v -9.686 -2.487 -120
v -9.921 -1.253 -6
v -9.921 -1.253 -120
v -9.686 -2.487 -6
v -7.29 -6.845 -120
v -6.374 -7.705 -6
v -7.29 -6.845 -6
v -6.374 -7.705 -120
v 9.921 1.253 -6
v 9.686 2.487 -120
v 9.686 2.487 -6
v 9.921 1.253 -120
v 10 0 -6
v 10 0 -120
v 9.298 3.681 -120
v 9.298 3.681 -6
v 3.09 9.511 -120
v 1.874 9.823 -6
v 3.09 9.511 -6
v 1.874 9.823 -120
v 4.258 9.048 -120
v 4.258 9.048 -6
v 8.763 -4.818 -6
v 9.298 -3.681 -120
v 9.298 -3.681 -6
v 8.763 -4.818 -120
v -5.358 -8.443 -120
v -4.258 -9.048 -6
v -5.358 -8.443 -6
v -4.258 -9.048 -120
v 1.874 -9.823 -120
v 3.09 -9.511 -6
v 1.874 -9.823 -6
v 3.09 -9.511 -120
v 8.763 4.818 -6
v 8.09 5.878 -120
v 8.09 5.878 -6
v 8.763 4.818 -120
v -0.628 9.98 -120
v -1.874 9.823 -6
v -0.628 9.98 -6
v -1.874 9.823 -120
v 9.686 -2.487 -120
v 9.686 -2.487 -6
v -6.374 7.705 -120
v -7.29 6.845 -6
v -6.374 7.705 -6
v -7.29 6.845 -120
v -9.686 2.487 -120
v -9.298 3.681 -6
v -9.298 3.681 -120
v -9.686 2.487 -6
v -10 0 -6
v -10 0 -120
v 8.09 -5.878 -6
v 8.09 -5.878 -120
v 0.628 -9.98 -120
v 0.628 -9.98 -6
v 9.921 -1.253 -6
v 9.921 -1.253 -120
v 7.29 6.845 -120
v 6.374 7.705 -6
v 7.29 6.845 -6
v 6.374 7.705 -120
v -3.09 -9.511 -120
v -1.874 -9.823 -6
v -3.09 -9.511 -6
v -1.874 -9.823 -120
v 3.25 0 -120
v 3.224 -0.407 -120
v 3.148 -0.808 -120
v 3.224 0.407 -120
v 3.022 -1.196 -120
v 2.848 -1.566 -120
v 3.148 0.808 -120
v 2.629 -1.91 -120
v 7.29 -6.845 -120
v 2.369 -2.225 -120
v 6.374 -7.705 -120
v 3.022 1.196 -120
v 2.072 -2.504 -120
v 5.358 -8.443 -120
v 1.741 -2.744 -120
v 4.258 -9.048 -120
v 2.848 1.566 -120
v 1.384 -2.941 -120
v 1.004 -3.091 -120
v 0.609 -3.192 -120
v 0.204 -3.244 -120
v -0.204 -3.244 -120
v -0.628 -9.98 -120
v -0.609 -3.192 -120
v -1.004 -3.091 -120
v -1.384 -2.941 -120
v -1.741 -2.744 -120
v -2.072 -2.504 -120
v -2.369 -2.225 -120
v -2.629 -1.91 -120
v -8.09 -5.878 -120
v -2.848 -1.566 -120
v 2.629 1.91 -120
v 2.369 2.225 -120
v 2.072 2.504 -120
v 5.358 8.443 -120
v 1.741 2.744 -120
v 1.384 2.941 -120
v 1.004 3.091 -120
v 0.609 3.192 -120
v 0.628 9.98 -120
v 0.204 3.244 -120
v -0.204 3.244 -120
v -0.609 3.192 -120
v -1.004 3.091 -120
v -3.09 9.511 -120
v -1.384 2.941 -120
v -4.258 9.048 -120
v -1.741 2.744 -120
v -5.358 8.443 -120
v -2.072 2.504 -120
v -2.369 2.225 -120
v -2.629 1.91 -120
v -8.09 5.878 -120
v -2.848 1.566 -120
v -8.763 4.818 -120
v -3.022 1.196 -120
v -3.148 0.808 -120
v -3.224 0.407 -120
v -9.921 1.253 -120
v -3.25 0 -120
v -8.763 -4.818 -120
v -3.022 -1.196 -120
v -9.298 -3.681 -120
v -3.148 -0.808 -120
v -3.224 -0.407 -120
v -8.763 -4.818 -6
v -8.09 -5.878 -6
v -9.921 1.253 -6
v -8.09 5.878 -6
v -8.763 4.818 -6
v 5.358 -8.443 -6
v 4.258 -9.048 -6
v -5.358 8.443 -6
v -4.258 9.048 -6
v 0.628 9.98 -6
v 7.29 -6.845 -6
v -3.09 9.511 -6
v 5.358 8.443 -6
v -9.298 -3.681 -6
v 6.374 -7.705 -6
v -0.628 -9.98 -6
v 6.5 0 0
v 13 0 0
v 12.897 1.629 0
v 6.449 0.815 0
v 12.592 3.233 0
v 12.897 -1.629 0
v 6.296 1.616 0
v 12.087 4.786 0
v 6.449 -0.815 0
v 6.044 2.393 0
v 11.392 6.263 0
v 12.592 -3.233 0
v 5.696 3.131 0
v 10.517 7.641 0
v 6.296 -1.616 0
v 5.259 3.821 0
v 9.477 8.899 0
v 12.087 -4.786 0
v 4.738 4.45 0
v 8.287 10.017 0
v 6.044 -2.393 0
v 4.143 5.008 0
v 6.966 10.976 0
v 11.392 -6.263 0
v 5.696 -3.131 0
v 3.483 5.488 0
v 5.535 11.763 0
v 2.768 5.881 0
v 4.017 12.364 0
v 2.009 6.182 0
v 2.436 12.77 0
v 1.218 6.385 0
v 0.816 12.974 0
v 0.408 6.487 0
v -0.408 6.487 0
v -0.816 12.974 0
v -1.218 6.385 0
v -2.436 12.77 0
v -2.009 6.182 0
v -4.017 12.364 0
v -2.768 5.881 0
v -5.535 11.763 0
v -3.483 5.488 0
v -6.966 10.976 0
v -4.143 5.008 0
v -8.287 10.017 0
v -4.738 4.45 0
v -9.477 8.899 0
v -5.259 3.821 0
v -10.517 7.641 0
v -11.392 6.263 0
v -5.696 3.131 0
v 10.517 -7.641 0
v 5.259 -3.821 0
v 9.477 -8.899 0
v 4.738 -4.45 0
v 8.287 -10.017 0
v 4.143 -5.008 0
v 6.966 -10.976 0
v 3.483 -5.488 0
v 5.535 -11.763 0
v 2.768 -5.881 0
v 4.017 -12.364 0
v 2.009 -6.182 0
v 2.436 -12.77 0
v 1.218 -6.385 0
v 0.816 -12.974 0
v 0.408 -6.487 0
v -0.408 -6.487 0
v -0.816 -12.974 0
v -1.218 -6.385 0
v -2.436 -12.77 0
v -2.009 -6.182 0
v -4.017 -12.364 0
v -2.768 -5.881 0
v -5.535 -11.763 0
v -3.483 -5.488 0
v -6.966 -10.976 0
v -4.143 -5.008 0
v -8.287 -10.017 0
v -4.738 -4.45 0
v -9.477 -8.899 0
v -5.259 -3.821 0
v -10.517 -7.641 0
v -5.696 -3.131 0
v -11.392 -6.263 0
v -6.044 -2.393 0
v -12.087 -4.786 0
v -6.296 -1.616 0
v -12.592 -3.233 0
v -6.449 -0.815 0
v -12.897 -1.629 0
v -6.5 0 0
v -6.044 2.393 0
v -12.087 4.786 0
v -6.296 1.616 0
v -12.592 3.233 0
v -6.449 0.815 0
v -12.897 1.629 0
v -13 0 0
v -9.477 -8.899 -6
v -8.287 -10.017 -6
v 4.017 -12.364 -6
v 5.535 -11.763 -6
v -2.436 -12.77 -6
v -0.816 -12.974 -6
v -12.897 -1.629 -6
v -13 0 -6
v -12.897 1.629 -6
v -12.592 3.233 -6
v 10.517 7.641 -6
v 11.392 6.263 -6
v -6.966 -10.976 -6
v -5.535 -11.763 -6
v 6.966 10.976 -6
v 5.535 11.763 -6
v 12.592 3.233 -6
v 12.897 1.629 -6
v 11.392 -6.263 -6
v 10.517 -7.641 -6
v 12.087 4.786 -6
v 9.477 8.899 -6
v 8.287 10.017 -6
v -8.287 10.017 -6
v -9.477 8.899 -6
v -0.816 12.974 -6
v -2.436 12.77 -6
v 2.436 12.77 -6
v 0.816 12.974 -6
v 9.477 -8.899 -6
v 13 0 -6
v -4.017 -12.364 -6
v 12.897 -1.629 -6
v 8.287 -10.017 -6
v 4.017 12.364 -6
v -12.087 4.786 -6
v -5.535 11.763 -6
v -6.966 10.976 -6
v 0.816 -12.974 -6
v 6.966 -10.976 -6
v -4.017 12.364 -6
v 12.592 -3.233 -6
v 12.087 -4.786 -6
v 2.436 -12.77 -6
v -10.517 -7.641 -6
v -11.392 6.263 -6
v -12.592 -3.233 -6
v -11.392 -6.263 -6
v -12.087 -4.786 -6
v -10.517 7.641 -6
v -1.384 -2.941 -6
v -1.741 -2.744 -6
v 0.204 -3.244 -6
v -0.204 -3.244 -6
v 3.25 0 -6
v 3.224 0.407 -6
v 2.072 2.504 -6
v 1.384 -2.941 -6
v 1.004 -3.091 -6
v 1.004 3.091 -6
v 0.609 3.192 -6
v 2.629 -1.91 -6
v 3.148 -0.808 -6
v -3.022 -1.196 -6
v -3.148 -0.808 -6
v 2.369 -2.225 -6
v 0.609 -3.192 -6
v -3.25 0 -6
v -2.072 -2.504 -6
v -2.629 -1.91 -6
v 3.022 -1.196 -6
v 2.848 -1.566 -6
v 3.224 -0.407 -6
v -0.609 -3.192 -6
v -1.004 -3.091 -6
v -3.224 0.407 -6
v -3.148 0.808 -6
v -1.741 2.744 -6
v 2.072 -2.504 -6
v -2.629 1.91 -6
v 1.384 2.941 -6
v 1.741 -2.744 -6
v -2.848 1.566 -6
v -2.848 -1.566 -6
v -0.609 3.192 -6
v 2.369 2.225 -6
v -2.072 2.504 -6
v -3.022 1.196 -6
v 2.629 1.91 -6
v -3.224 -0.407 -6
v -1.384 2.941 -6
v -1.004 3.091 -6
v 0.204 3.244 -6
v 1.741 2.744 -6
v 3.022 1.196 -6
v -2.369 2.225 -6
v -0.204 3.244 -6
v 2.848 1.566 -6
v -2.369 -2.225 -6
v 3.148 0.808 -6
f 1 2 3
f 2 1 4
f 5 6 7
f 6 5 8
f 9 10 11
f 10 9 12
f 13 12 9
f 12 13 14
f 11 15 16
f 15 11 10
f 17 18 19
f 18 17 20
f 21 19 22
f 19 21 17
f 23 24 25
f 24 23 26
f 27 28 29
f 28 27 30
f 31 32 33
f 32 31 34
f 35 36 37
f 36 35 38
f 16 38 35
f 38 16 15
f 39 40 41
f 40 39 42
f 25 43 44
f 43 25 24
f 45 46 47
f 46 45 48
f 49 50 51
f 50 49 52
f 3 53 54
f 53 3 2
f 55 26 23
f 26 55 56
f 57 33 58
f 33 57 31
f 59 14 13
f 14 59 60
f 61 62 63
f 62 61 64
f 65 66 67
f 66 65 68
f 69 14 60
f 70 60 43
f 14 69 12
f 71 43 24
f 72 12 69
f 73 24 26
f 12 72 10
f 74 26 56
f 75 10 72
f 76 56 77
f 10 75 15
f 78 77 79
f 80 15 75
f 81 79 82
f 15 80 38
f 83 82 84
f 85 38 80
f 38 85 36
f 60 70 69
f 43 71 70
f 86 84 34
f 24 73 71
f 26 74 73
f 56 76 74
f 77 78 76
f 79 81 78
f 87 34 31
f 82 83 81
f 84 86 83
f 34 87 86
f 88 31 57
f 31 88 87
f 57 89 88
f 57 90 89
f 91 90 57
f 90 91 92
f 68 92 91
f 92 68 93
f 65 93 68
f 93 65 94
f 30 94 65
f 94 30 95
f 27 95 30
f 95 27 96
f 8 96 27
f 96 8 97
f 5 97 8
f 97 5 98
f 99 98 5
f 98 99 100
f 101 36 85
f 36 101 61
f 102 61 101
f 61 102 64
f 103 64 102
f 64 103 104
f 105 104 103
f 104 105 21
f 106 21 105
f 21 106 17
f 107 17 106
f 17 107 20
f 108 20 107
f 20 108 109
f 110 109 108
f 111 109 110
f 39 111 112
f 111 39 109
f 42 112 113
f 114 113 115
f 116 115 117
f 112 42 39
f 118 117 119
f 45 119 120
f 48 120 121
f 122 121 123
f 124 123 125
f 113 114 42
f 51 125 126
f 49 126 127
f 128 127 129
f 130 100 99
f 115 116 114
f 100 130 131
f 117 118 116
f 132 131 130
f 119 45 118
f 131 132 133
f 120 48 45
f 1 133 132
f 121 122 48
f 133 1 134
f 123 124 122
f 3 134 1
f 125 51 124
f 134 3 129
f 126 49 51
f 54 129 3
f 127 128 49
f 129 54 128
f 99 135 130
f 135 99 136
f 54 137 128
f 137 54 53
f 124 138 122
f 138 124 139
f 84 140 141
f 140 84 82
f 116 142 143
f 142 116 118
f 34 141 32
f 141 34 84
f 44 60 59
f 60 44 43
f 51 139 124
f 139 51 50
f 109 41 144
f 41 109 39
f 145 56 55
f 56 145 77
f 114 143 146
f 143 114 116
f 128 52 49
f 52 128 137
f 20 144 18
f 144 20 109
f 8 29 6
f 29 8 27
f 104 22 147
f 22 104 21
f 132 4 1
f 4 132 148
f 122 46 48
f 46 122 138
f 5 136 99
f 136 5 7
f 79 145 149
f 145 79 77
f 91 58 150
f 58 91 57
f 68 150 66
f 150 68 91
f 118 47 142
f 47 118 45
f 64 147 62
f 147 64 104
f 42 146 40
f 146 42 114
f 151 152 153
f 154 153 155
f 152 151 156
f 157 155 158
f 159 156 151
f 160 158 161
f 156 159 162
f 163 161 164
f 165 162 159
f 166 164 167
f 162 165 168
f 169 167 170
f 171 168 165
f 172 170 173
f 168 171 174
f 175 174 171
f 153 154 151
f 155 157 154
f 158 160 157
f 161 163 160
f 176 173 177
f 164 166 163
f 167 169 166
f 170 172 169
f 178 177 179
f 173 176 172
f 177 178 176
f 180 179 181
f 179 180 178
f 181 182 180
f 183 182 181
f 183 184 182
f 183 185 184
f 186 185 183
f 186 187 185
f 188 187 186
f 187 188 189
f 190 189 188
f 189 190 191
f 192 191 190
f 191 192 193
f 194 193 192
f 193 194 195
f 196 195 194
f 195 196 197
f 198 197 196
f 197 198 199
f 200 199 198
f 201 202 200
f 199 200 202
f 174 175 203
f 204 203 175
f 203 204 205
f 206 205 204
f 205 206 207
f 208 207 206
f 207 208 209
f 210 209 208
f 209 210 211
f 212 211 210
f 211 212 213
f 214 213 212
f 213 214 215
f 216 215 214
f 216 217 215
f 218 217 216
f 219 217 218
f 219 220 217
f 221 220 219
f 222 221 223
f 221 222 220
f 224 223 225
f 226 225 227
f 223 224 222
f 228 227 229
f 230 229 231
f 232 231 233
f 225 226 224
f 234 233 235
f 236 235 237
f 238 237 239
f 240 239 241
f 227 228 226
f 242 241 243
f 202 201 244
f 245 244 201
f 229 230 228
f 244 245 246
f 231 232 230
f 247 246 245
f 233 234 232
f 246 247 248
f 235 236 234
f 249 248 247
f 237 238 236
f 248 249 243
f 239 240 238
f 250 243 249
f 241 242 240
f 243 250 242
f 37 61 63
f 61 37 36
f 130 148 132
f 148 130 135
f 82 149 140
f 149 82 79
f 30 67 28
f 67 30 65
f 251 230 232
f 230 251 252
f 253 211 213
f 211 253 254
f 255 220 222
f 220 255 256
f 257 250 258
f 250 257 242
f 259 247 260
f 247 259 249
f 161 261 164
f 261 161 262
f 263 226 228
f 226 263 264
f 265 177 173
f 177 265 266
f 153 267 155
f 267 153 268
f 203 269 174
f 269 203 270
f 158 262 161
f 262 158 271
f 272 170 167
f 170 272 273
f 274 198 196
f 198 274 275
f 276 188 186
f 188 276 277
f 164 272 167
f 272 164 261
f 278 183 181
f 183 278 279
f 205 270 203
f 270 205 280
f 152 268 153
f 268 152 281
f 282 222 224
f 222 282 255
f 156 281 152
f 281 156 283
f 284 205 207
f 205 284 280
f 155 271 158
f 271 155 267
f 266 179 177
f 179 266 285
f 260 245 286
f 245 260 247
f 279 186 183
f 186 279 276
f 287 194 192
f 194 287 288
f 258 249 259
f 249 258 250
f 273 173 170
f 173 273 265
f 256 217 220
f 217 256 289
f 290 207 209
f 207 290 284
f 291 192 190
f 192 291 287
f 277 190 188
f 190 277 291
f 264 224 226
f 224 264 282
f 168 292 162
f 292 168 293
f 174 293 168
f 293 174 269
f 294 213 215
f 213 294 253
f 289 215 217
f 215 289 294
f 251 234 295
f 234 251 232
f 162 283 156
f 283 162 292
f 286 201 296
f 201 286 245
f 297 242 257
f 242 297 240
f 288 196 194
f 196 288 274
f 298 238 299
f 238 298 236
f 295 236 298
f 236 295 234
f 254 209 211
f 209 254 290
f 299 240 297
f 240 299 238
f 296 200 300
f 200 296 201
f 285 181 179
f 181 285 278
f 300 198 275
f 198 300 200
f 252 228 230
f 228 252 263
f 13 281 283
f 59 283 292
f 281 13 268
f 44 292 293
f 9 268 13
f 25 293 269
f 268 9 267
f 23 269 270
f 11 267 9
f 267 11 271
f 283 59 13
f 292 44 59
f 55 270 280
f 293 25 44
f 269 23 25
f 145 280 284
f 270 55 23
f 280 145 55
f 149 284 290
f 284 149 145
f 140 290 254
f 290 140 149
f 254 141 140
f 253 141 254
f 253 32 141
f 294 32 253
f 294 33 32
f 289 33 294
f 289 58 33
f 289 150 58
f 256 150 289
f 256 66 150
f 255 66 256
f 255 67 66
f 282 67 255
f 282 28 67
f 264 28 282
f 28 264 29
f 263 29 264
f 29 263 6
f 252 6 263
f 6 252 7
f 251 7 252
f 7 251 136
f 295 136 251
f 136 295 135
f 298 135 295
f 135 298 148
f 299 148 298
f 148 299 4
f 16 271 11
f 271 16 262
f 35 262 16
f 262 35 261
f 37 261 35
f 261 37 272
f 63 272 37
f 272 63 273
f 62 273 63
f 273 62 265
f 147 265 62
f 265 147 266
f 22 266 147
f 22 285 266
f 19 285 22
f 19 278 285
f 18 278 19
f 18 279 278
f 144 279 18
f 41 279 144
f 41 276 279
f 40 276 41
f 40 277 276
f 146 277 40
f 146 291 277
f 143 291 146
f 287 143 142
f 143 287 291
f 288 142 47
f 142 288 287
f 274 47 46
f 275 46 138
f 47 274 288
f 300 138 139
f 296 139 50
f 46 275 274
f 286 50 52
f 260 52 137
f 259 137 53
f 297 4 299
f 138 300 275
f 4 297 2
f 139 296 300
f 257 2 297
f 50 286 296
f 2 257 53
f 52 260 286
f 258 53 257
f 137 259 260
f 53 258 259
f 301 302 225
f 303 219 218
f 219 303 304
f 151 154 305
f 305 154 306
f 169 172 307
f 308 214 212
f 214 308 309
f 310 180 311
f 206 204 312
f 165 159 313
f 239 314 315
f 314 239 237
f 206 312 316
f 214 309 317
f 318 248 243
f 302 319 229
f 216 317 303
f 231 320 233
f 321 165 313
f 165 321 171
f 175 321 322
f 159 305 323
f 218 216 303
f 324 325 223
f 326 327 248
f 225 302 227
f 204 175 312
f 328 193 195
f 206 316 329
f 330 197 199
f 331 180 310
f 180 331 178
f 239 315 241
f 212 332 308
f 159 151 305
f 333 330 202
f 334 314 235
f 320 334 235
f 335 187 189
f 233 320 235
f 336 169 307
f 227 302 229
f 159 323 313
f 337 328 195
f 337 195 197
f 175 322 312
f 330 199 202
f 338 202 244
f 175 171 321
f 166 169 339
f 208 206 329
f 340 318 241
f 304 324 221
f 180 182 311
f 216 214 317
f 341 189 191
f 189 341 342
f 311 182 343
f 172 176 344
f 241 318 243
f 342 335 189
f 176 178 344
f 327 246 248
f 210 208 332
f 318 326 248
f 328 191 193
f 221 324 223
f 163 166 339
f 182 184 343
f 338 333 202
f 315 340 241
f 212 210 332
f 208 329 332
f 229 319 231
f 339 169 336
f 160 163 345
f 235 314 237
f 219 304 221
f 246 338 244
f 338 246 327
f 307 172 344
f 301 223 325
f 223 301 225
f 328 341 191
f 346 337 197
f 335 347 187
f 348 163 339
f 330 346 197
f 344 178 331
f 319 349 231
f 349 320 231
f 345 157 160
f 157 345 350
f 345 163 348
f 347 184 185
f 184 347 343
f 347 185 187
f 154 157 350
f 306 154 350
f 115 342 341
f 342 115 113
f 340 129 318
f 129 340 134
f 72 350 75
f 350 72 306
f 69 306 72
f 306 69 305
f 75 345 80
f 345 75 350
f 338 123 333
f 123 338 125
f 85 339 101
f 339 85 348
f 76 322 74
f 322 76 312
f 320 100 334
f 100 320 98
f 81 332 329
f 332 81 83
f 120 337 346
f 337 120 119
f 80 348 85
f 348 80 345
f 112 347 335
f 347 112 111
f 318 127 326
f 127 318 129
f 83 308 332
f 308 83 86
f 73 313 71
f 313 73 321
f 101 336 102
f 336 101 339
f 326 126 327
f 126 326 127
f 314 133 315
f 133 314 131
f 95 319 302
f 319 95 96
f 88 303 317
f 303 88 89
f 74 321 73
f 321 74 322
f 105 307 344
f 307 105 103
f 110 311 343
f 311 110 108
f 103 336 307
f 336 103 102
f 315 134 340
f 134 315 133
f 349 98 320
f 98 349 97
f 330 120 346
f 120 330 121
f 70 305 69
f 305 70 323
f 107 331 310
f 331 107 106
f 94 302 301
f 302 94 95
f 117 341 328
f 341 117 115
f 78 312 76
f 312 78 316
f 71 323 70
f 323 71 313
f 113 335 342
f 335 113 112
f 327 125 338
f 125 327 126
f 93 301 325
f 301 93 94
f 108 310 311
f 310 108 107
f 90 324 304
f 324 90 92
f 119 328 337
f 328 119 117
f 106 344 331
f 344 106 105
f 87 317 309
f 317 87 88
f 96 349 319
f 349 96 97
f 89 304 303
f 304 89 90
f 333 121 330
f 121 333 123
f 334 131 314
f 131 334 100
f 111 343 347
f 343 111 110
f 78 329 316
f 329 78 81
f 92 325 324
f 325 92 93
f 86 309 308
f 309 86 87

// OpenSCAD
$fn = 50;


difference() {
	union() {
		translate(v = [0, 0, -120.0000000000]) {
			cylinder(h = 120, r = 10.0000000000);
		}
		translate(v = [0, 0, -6.0000000000]) {
			cylinder(h = 6, r = 13.0000000000);
		}
	}
	union() {
		translate(v = [0, 0, 0]) {
			rotate(a = [0, 0, 0]) {
				difference() {
					union() {
						#translate(v = [0, 0, -120.0000000000]) {
							cylinder(h = 120, r = 2.2500000000);
						}
						#translate(v = [0, 0, -6]) {
							cylinder(h = 6, r = 10.0000000000, r1 = 3.2500000000, r2 = 6.5000000000);
						}
						#translate(v = [0, 0, -120.0000000000]) {
							cylinder(h = 120, r = 3.2500000000);
						}
						#translate(v = [0, 0, -120.0000000000]) {
							cylinder(h = 120, r = 2.2500000000);
						}
					}
					union();
				}
			}
		}
	}
}
